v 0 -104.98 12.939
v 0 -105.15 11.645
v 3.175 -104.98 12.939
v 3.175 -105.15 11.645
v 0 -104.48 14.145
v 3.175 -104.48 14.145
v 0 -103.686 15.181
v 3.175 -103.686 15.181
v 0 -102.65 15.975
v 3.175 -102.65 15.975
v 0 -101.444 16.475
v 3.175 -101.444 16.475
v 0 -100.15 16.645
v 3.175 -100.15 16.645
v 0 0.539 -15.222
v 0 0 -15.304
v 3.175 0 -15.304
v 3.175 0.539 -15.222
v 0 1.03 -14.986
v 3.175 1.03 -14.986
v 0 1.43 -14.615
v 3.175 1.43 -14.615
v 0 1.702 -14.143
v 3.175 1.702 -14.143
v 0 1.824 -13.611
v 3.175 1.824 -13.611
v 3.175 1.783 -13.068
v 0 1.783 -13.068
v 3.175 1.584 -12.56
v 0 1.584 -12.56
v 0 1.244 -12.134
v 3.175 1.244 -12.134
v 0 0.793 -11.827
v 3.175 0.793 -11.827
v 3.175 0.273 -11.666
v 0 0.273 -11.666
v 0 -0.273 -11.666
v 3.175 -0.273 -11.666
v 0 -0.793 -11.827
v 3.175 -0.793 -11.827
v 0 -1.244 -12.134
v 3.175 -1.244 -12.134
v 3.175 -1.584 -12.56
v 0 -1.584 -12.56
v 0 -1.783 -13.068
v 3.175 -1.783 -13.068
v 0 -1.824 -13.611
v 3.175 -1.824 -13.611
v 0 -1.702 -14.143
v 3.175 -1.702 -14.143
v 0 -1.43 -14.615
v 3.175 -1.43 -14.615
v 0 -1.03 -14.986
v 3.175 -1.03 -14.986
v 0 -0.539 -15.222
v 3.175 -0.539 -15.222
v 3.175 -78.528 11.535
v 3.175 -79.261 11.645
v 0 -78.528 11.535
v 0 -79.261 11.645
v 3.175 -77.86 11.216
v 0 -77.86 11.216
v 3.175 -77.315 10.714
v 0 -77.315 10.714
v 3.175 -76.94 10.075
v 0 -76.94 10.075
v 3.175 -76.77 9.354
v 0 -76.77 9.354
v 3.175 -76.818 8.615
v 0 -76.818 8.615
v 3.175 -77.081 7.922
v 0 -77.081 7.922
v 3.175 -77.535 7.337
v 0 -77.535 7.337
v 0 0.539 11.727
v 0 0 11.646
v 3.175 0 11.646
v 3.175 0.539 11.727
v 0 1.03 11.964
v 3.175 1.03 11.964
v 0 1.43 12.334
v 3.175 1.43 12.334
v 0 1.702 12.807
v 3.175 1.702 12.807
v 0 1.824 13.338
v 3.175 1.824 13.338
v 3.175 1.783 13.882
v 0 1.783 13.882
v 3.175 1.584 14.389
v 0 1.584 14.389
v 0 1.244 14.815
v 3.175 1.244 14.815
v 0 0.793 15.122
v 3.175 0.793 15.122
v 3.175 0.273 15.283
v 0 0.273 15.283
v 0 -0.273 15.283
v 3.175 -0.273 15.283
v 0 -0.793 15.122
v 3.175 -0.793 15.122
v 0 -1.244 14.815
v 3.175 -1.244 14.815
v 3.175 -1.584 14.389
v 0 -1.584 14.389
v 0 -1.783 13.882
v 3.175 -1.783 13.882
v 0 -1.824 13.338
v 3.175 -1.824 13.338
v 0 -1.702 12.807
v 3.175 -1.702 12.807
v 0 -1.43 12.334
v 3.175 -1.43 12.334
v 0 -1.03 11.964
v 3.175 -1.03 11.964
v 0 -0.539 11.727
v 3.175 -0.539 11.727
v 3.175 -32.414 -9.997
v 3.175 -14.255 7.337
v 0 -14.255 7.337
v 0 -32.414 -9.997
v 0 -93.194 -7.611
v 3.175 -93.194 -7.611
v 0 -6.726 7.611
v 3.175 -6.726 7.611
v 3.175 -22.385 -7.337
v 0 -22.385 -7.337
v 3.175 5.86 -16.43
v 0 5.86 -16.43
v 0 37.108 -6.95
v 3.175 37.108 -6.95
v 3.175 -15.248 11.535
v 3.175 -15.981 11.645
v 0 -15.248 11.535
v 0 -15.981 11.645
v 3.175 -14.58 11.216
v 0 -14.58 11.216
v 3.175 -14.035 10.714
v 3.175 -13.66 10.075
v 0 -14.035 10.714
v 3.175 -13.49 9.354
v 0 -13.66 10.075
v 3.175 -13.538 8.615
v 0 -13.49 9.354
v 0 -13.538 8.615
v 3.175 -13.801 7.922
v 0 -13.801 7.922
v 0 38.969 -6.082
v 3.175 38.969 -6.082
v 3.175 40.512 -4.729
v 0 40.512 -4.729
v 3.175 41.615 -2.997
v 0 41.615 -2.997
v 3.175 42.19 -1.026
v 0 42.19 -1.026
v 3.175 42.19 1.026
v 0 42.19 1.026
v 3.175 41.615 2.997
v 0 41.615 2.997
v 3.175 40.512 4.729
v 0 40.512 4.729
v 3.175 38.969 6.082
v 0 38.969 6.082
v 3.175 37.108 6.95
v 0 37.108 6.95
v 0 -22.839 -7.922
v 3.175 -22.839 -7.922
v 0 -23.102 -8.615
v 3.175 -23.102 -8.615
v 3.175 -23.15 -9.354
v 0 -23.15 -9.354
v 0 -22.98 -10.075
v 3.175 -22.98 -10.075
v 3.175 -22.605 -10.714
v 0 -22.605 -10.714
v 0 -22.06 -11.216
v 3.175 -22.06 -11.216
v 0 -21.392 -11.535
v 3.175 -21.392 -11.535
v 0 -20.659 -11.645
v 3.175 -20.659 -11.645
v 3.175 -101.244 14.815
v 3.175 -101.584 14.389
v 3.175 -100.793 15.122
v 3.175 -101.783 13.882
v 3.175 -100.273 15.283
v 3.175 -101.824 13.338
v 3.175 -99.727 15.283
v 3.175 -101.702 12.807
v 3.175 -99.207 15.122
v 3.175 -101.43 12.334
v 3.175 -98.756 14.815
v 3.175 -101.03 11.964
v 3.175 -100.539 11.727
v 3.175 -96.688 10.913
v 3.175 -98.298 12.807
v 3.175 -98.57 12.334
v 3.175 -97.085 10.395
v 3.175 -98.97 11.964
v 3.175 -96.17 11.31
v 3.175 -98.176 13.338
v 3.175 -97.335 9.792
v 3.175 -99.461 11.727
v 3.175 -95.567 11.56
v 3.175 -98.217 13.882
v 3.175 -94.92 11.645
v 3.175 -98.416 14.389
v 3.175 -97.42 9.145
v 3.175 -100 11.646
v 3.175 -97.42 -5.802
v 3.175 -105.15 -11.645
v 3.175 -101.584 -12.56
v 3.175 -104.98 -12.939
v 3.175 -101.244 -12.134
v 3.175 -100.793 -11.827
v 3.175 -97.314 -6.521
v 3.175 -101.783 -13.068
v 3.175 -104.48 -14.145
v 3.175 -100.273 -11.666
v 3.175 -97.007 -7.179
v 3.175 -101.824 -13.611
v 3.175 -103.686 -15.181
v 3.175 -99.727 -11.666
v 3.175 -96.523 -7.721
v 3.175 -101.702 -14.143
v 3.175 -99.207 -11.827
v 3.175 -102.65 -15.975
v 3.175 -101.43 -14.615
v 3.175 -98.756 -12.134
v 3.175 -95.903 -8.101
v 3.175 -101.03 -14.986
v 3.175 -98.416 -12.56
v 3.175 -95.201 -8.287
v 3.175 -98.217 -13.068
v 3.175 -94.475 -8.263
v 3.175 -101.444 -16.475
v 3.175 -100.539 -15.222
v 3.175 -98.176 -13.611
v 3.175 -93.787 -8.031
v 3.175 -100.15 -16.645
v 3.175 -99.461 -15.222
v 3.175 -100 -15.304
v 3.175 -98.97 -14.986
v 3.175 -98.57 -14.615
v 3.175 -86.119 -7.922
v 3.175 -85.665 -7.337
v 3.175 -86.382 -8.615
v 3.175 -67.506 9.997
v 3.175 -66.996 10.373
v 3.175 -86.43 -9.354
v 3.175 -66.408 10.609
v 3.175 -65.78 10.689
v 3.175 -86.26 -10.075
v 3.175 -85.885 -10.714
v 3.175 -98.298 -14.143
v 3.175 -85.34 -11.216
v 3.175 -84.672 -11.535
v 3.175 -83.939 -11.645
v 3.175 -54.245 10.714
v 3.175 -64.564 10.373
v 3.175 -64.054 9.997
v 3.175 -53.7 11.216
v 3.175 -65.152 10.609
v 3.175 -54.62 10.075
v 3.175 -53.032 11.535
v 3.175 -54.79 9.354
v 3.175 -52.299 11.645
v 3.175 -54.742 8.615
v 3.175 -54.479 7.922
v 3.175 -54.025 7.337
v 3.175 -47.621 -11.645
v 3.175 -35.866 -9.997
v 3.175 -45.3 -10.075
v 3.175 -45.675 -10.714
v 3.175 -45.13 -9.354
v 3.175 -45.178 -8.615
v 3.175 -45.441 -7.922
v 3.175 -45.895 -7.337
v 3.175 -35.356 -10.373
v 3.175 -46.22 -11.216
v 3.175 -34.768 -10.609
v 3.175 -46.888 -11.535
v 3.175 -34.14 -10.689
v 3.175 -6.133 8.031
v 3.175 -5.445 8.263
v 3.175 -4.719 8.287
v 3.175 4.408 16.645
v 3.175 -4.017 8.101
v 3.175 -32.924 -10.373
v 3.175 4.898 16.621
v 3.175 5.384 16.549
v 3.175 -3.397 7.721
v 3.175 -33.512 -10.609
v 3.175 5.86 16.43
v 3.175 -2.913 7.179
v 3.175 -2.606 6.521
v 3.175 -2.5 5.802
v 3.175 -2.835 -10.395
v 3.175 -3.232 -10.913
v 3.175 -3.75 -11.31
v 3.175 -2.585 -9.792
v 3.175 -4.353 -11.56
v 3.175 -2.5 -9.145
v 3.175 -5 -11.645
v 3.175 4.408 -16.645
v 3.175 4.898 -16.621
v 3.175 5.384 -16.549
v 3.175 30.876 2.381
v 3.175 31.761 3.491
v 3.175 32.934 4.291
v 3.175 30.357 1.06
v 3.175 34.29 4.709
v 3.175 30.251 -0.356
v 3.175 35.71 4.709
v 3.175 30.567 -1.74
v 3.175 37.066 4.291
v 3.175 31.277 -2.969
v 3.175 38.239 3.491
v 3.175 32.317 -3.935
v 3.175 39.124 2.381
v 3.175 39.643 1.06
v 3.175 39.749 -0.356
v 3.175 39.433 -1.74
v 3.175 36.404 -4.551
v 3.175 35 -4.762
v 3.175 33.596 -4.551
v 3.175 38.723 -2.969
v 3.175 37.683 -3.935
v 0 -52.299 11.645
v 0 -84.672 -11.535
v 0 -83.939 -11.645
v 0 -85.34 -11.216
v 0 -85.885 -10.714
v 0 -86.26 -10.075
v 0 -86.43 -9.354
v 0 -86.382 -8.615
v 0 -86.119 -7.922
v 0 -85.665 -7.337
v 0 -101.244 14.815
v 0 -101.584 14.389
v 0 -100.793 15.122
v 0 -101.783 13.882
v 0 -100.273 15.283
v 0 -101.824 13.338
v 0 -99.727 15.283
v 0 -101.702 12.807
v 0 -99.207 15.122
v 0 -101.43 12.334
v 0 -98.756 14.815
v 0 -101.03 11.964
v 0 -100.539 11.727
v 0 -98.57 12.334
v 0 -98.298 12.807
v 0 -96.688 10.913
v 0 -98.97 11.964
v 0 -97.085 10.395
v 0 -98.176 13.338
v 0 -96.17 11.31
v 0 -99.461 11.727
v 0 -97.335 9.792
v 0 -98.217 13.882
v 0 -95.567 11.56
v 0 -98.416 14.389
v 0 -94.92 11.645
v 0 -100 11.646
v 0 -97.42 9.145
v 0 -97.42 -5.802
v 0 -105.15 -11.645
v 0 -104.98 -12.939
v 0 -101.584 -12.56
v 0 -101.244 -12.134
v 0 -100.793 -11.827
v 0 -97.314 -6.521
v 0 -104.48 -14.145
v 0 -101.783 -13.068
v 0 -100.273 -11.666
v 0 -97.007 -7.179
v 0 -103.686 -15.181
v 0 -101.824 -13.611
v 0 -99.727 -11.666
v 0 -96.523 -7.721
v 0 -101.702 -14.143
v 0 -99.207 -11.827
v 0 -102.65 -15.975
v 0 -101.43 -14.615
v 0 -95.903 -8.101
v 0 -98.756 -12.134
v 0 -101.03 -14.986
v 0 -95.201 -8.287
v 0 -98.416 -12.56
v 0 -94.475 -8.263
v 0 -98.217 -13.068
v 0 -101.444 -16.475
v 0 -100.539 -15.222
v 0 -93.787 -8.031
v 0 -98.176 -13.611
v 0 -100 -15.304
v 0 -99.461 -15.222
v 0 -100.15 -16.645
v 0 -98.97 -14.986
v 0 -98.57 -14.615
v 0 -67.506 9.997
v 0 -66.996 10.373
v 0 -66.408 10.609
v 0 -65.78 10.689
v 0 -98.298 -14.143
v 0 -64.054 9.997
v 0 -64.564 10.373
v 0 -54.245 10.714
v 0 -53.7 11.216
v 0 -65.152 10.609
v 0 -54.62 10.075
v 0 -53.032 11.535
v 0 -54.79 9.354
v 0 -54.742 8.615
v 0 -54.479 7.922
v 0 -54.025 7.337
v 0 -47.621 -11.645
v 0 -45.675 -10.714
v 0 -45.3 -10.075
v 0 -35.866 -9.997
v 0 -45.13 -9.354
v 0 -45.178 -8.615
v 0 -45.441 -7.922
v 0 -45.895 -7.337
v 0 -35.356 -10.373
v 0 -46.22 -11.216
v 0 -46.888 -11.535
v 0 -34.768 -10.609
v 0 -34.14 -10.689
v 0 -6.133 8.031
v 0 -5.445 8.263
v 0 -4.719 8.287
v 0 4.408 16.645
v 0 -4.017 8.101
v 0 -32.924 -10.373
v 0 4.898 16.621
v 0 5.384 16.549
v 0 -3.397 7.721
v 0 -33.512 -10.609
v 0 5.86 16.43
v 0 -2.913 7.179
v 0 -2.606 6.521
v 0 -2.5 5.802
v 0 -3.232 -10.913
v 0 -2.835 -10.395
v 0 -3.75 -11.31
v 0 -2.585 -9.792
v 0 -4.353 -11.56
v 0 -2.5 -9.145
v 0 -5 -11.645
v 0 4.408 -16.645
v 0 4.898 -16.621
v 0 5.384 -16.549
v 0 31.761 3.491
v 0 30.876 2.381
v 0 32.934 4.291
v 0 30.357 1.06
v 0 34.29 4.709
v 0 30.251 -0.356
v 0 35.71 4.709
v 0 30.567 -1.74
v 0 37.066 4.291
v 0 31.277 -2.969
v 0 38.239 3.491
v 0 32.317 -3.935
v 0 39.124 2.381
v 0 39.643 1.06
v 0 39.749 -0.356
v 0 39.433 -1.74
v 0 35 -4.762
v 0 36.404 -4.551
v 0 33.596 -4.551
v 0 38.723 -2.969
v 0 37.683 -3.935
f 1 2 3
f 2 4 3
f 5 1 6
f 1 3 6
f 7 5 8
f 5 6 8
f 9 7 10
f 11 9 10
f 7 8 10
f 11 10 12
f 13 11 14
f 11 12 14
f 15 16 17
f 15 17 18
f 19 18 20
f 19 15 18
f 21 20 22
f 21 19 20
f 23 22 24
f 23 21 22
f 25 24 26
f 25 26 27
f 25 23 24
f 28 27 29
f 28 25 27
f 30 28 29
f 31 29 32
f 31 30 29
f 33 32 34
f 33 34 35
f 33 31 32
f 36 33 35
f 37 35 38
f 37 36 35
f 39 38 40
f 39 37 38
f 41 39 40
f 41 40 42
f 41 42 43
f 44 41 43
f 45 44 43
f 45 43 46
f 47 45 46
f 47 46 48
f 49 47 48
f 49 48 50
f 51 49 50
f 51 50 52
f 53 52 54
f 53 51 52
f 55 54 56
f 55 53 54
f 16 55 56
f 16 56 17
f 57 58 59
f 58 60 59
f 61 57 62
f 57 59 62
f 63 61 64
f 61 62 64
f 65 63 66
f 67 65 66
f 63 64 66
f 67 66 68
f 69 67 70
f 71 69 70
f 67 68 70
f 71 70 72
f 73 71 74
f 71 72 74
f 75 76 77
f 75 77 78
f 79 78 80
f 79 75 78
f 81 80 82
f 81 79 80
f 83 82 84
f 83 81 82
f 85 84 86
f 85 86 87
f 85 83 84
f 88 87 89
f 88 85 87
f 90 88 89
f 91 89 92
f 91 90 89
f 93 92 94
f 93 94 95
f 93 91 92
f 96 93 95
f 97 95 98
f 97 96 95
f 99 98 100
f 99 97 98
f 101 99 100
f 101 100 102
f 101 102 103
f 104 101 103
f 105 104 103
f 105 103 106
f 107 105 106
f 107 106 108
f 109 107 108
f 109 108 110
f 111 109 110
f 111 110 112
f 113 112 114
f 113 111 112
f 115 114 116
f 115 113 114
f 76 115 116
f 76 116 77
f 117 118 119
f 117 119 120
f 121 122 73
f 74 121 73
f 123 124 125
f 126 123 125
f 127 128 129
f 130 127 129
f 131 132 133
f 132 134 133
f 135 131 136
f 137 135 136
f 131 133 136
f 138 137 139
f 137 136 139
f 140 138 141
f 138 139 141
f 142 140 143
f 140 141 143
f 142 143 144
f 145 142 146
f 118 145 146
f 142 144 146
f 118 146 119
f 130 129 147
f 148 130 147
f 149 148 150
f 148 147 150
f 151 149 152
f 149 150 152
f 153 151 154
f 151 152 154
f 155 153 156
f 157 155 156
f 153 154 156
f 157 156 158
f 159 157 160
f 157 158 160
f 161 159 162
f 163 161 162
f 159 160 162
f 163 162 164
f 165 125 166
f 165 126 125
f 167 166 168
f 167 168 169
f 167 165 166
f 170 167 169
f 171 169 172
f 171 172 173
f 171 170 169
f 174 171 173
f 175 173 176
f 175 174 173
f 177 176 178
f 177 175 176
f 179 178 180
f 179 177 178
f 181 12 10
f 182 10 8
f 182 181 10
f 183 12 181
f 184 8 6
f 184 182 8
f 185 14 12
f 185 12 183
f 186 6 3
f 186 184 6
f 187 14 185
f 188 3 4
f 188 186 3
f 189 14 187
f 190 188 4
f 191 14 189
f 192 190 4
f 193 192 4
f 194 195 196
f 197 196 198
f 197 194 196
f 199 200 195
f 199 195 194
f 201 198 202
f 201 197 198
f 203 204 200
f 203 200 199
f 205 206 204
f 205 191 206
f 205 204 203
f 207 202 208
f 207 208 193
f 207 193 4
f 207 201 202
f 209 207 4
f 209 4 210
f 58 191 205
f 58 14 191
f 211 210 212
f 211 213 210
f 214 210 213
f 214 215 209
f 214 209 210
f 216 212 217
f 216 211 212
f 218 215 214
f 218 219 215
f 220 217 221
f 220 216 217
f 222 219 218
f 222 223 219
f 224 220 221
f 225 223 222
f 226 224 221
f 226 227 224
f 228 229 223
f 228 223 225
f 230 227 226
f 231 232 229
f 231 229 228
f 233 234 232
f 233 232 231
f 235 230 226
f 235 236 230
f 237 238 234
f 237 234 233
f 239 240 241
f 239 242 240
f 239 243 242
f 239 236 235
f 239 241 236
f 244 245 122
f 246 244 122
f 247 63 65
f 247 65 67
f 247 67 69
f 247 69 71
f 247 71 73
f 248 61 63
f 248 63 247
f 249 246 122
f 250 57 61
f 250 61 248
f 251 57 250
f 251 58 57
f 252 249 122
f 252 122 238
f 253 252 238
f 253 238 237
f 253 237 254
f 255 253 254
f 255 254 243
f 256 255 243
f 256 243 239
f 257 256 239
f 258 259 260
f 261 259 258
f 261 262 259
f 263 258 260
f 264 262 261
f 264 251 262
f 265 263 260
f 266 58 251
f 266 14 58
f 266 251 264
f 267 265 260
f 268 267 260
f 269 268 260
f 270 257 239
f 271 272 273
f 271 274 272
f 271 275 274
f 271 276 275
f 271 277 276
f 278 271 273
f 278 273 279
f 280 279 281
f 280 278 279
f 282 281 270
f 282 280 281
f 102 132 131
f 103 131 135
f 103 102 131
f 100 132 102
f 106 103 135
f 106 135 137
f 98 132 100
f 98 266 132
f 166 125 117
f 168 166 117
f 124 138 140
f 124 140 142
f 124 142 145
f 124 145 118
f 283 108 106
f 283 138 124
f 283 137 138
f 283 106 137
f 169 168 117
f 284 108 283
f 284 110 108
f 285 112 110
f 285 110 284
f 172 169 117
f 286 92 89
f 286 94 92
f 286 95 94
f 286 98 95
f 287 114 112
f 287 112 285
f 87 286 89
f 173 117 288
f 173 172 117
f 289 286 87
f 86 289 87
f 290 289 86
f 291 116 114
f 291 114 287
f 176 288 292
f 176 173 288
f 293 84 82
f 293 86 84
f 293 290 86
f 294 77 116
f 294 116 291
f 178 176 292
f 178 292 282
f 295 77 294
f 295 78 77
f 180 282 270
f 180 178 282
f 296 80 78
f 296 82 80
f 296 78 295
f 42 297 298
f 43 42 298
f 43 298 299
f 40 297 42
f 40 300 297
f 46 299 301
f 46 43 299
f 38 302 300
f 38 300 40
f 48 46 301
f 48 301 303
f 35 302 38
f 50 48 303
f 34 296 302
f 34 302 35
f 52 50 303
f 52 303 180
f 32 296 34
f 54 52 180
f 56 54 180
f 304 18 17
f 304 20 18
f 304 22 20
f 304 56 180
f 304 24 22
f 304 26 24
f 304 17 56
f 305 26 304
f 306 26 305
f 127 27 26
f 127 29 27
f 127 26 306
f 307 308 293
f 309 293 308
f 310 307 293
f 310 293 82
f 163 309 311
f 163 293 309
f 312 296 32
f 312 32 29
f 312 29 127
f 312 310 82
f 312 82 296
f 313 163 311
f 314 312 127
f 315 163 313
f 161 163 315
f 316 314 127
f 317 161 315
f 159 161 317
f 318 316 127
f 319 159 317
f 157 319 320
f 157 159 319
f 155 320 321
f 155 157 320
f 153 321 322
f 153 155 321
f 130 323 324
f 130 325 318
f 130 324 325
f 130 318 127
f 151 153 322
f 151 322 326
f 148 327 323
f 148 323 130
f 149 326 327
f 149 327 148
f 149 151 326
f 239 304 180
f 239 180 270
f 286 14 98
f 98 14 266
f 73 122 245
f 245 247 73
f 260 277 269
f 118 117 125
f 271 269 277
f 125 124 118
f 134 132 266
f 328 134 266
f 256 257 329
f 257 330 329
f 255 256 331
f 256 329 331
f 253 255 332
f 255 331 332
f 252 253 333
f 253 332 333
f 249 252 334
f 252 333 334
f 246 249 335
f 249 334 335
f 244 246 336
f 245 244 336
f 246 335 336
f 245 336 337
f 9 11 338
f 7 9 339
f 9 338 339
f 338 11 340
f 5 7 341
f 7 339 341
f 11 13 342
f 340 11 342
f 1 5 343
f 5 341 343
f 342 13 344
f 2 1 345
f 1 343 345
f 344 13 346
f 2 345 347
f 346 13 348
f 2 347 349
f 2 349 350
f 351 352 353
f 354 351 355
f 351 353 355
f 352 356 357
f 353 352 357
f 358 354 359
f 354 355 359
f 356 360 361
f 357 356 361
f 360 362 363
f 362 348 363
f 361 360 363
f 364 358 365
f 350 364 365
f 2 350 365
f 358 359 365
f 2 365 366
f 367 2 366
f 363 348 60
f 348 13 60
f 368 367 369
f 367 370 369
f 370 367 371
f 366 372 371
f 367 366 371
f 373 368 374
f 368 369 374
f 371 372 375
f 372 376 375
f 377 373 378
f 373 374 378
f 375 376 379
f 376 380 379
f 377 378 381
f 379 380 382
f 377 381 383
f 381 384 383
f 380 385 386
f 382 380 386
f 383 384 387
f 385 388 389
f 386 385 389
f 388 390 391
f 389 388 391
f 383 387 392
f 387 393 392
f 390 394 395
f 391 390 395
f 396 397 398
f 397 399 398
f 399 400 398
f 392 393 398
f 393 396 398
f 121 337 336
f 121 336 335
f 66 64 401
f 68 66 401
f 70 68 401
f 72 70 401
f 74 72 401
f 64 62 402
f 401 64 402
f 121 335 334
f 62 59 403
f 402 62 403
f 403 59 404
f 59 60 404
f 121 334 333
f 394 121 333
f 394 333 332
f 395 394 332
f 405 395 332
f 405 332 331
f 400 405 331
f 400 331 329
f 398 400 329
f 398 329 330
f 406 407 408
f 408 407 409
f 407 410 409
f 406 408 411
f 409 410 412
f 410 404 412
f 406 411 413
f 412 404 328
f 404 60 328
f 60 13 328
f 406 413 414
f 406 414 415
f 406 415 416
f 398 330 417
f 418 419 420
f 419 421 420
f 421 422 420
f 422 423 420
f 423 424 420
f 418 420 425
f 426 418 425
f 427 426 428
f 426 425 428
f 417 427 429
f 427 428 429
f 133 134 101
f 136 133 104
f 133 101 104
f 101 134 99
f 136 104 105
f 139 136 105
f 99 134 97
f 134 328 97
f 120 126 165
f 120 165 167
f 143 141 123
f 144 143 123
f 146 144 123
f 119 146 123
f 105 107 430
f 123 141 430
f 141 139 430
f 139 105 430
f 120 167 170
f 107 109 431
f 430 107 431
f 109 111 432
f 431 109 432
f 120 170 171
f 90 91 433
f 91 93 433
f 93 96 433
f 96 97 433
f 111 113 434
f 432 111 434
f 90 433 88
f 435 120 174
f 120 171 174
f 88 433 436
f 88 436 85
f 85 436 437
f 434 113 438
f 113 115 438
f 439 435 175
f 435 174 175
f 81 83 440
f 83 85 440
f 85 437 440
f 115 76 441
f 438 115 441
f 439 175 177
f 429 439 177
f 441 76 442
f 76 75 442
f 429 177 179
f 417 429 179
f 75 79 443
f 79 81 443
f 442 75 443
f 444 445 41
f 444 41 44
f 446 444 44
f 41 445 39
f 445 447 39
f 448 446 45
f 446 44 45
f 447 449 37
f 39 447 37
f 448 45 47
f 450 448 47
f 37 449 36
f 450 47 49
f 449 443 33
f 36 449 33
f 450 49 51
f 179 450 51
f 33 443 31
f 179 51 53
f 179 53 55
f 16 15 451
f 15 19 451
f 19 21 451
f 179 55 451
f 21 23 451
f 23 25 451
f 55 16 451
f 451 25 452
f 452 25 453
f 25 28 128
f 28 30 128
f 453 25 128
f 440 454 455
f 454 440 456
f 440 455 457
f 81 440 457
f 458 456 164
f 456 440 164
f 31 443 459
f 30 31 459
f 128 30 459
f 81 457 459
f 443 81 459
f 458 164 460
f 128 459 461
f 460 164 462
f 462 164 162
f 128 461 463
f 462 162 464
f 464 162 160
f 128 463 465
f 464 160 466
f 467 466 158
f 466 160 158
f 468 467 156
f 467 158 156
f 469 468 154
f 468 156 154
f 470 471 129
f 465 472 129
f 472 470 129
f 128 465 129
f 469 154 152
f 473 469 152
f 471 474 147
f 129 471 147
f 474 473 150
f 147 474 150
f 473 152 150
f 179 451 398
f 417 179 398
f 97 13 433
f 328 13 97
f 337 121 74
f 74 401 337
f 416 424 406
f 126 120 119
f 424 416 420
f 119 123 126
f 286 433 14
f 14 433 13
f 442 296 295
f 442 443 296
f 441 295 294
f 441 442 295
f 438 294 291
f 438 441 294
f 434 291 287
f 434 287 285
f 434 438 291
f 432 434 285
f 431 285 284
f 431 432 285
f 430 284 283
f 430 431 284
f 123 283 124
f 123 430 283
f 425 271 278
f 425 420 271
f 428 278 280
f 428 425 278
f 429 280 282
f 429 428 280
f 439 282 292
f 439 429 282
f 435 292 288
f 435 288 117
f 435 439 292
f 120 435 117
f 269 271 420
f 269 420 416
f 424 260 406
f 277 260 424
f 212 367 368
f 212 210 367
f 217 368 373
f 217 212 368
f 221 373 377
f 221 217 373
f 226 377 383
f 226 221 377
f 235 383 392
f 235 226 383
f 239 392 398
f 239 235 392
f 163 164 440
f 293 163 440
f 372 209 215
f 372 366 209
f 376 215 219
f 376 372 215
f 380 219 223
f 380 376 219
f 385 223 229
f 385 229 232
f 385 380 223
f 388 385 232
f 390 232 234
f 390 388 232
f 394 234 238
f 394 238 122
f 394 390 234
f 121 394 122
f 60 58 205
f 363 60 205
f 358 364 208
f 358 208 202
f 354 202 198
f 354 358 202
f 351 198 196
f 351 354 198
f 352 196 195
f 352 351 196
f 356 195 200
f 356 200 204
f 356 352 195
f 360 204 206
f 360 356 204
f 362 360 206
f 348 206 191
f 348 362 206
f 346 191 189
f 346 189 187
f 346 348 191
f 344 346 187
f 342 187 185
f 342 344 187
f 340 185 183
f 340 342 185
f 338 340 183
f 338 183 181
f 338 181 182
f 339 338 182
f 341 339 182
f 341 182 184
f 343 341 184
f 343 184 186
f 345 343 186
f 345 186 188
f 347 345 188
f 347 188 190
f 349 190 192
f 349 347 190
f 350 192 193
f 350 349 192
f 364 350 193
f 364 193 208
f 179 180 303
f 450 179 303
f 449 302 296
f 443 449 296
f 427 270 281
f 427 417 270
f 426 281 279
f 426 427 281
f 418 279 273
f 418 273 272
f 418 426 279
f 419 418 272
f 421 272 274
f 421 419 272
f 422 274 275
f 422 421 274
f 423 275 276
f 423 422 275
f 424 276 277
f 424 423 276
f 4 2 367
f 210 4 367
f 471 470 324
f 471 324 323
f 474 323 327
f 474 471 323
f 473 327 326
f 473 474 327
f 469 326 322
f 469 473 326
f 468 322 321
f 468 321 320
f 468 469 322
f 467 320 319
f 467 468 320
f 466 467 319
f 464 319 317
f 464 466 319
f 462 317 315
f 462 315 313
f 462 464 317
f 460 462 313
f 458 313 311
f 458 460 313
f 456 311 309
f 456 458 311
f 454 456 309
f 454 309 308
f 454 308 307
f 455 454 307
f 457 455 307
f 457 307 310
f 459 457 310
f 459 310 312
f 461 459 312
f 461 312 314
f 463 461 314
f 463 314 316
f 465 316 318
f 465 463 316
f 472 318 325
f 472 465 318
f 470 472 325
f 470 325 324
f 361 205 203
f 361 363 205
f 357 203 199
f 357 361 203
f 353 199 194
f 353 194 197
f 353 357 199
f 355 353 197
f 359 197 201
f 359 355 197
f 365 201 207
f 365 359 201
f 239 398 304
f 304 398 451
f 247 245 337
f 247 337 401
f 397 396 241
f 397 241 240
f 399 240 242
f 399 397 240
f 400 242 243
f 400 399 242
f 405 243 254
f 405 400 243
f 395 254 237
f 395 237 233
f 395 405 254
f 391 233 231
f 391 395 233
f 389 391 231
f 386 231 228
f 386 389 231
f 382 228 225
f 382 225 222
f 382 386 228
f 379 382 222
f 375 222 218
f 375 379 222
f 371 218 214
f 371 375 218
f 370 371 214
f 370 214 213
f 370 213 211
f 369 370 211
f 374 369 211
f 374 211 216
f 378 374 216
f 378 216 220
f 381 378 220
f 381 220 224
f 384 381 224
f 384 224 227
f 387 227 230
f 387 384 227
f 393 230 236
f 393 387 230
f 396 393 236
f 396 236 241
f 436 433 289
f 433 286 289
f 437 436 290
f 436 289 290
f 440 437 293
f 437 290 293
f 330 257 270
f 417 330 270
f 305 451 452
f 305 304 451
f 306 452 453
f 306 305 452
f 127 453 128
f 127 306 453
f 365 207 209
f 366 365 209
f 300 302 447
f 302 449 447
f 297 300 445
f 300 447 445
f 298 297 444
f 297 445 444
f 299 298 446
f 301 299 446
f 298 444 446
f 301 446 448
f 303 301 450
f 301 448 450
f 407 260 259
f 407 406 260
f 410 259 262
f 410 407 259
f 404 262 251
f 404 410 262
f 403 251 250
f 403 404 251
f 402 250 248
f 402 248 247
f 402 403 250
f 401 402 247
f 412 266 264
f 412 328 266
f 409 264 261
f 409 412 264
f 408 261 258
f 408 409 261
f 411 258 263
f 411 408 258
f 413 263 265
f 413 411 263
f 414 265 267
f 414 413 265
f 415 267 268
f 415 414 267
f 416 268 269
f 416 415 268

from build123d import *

# Parameters (mm, degrees)
SKETCH1_R           = 1.8288
SKETCH1_R_2         = 4.7625
BOSS_EXTRUDE1_DEPTH = 3.175
CUT_EXTRUDE1_DEPTH  = 107.506615522
FILLET1_R           = 2.5
FILLET2_R           = 5


with BuildPart() as part:
    # Sketch1 → Boss-Extrude1 (new body)
    with BuildSketch(Plane(origin=(0, 0, 0), x_dir=(0, 0, -1), z_dir=(1, 0, 0))):
        with BuildLine():
            Line((-16.645, -105.15), (16.645, -105.15))
            Line((16.645, -105.15), (16.645, 5.15))
            Line((16.645, 5.15), (6.94973031, 37.108353593))
            ThreePointArc((6.94973031, 37.108353593), (0, 42.2625), (-6.94973031, 37.108353593))
            Line((-6.94973031, 37.108353593), (-16.645, 5.15))
            Line((-16.645, 5.15), (-16.645, -105.15))
        make_face()
        with Locations((-13.4747, 0)):
            Circle(SKETCH1_R, mode=Mode.SUBTRACT)
        with Locations((0, 35)):
            Circle(SKETCH1_R_2, mode=Mode.SUBTRACT)
        with Locations((13.4747, 0)):
            Circle(SKETCH1_R, mode=Mode.SUBTRACT)
        with Locations((-13.4747, -100)):
            Circle(SKETCH1_R, mode=Mode.SUBTRACT)
        with Locations((13.4747, -100)):
            Circle(SKETCH1_R, mode=Mode.SUBTRACT)
    extrude(amount=BOSS_EXTRUDE1_DEPTH)

    # Sketch2 → Cut-Extrude1 (cut, through all)
    with BuildSketch(Plane(origin=(3.175, 0, 0), x_dir=(0, 0, -1), z_dir=(1, 0, 0))):
        Polygon((11.645, -2.5), (-11.645, -2.5), (11.645, -26.898674048), align=None)
        Polygon((-11.645, -9.741325952), (11.645, -34.14), (-11.645, -58.538674048), (-11.645, -34.14), align=None)
        Polygon((-11.645, -73.021325952), (-11.645, -97.42), (11.645, -97.42), align=None)
        Polygon((11.645, -41.381325952), (11.645, -65.78), (11.645, -90.178674048), (-11.645, -65.78), align=None)
    extrude(amount=-CUT_EXTRUDE1_DEPTH, mode=Mode.SUBTRACT)

    # Fillet1
    fillet1_edges = [part.edges().sort_by_distance(p)[0] for p in [
        (1.5875, -9.741325952, 11.645),
        (1.5875, -34.14, -11.645),
        (1.5875, -58.538674048, 11.645),
        (1.5875, -26.898674048, -11.645),
        (1.5875, -2.5, 11.645),
        (1.5875, -2.5, -11.645),
        (1.5875, -90.178674048, -11.645),
        (1.5875, -65.78, 11.645),
        (1.5875, -41.381325952, -11.645),
        (1.5875, -73.021325952, 11.645),
        (1.5875, -97.42, -11.645),
        (1.5875, -97.42, 11.645),
    ]]
    fillet(fillet1_edges, radius=FILLET1_R)

    # Fillet2
    fillet2_edges = [part.edges().sort_by_distance(p)[0] for p in [
        (1.5875, -105.15, -16.645),
        (1.5875, -105.15, 16.645),
        (1.5875, 5.15, 16.645),
        (1.5875, 5.15, -16.645),
    ]]
    fillet(fillet2_edges, radius=FILLET2_R)


solid = part.part
